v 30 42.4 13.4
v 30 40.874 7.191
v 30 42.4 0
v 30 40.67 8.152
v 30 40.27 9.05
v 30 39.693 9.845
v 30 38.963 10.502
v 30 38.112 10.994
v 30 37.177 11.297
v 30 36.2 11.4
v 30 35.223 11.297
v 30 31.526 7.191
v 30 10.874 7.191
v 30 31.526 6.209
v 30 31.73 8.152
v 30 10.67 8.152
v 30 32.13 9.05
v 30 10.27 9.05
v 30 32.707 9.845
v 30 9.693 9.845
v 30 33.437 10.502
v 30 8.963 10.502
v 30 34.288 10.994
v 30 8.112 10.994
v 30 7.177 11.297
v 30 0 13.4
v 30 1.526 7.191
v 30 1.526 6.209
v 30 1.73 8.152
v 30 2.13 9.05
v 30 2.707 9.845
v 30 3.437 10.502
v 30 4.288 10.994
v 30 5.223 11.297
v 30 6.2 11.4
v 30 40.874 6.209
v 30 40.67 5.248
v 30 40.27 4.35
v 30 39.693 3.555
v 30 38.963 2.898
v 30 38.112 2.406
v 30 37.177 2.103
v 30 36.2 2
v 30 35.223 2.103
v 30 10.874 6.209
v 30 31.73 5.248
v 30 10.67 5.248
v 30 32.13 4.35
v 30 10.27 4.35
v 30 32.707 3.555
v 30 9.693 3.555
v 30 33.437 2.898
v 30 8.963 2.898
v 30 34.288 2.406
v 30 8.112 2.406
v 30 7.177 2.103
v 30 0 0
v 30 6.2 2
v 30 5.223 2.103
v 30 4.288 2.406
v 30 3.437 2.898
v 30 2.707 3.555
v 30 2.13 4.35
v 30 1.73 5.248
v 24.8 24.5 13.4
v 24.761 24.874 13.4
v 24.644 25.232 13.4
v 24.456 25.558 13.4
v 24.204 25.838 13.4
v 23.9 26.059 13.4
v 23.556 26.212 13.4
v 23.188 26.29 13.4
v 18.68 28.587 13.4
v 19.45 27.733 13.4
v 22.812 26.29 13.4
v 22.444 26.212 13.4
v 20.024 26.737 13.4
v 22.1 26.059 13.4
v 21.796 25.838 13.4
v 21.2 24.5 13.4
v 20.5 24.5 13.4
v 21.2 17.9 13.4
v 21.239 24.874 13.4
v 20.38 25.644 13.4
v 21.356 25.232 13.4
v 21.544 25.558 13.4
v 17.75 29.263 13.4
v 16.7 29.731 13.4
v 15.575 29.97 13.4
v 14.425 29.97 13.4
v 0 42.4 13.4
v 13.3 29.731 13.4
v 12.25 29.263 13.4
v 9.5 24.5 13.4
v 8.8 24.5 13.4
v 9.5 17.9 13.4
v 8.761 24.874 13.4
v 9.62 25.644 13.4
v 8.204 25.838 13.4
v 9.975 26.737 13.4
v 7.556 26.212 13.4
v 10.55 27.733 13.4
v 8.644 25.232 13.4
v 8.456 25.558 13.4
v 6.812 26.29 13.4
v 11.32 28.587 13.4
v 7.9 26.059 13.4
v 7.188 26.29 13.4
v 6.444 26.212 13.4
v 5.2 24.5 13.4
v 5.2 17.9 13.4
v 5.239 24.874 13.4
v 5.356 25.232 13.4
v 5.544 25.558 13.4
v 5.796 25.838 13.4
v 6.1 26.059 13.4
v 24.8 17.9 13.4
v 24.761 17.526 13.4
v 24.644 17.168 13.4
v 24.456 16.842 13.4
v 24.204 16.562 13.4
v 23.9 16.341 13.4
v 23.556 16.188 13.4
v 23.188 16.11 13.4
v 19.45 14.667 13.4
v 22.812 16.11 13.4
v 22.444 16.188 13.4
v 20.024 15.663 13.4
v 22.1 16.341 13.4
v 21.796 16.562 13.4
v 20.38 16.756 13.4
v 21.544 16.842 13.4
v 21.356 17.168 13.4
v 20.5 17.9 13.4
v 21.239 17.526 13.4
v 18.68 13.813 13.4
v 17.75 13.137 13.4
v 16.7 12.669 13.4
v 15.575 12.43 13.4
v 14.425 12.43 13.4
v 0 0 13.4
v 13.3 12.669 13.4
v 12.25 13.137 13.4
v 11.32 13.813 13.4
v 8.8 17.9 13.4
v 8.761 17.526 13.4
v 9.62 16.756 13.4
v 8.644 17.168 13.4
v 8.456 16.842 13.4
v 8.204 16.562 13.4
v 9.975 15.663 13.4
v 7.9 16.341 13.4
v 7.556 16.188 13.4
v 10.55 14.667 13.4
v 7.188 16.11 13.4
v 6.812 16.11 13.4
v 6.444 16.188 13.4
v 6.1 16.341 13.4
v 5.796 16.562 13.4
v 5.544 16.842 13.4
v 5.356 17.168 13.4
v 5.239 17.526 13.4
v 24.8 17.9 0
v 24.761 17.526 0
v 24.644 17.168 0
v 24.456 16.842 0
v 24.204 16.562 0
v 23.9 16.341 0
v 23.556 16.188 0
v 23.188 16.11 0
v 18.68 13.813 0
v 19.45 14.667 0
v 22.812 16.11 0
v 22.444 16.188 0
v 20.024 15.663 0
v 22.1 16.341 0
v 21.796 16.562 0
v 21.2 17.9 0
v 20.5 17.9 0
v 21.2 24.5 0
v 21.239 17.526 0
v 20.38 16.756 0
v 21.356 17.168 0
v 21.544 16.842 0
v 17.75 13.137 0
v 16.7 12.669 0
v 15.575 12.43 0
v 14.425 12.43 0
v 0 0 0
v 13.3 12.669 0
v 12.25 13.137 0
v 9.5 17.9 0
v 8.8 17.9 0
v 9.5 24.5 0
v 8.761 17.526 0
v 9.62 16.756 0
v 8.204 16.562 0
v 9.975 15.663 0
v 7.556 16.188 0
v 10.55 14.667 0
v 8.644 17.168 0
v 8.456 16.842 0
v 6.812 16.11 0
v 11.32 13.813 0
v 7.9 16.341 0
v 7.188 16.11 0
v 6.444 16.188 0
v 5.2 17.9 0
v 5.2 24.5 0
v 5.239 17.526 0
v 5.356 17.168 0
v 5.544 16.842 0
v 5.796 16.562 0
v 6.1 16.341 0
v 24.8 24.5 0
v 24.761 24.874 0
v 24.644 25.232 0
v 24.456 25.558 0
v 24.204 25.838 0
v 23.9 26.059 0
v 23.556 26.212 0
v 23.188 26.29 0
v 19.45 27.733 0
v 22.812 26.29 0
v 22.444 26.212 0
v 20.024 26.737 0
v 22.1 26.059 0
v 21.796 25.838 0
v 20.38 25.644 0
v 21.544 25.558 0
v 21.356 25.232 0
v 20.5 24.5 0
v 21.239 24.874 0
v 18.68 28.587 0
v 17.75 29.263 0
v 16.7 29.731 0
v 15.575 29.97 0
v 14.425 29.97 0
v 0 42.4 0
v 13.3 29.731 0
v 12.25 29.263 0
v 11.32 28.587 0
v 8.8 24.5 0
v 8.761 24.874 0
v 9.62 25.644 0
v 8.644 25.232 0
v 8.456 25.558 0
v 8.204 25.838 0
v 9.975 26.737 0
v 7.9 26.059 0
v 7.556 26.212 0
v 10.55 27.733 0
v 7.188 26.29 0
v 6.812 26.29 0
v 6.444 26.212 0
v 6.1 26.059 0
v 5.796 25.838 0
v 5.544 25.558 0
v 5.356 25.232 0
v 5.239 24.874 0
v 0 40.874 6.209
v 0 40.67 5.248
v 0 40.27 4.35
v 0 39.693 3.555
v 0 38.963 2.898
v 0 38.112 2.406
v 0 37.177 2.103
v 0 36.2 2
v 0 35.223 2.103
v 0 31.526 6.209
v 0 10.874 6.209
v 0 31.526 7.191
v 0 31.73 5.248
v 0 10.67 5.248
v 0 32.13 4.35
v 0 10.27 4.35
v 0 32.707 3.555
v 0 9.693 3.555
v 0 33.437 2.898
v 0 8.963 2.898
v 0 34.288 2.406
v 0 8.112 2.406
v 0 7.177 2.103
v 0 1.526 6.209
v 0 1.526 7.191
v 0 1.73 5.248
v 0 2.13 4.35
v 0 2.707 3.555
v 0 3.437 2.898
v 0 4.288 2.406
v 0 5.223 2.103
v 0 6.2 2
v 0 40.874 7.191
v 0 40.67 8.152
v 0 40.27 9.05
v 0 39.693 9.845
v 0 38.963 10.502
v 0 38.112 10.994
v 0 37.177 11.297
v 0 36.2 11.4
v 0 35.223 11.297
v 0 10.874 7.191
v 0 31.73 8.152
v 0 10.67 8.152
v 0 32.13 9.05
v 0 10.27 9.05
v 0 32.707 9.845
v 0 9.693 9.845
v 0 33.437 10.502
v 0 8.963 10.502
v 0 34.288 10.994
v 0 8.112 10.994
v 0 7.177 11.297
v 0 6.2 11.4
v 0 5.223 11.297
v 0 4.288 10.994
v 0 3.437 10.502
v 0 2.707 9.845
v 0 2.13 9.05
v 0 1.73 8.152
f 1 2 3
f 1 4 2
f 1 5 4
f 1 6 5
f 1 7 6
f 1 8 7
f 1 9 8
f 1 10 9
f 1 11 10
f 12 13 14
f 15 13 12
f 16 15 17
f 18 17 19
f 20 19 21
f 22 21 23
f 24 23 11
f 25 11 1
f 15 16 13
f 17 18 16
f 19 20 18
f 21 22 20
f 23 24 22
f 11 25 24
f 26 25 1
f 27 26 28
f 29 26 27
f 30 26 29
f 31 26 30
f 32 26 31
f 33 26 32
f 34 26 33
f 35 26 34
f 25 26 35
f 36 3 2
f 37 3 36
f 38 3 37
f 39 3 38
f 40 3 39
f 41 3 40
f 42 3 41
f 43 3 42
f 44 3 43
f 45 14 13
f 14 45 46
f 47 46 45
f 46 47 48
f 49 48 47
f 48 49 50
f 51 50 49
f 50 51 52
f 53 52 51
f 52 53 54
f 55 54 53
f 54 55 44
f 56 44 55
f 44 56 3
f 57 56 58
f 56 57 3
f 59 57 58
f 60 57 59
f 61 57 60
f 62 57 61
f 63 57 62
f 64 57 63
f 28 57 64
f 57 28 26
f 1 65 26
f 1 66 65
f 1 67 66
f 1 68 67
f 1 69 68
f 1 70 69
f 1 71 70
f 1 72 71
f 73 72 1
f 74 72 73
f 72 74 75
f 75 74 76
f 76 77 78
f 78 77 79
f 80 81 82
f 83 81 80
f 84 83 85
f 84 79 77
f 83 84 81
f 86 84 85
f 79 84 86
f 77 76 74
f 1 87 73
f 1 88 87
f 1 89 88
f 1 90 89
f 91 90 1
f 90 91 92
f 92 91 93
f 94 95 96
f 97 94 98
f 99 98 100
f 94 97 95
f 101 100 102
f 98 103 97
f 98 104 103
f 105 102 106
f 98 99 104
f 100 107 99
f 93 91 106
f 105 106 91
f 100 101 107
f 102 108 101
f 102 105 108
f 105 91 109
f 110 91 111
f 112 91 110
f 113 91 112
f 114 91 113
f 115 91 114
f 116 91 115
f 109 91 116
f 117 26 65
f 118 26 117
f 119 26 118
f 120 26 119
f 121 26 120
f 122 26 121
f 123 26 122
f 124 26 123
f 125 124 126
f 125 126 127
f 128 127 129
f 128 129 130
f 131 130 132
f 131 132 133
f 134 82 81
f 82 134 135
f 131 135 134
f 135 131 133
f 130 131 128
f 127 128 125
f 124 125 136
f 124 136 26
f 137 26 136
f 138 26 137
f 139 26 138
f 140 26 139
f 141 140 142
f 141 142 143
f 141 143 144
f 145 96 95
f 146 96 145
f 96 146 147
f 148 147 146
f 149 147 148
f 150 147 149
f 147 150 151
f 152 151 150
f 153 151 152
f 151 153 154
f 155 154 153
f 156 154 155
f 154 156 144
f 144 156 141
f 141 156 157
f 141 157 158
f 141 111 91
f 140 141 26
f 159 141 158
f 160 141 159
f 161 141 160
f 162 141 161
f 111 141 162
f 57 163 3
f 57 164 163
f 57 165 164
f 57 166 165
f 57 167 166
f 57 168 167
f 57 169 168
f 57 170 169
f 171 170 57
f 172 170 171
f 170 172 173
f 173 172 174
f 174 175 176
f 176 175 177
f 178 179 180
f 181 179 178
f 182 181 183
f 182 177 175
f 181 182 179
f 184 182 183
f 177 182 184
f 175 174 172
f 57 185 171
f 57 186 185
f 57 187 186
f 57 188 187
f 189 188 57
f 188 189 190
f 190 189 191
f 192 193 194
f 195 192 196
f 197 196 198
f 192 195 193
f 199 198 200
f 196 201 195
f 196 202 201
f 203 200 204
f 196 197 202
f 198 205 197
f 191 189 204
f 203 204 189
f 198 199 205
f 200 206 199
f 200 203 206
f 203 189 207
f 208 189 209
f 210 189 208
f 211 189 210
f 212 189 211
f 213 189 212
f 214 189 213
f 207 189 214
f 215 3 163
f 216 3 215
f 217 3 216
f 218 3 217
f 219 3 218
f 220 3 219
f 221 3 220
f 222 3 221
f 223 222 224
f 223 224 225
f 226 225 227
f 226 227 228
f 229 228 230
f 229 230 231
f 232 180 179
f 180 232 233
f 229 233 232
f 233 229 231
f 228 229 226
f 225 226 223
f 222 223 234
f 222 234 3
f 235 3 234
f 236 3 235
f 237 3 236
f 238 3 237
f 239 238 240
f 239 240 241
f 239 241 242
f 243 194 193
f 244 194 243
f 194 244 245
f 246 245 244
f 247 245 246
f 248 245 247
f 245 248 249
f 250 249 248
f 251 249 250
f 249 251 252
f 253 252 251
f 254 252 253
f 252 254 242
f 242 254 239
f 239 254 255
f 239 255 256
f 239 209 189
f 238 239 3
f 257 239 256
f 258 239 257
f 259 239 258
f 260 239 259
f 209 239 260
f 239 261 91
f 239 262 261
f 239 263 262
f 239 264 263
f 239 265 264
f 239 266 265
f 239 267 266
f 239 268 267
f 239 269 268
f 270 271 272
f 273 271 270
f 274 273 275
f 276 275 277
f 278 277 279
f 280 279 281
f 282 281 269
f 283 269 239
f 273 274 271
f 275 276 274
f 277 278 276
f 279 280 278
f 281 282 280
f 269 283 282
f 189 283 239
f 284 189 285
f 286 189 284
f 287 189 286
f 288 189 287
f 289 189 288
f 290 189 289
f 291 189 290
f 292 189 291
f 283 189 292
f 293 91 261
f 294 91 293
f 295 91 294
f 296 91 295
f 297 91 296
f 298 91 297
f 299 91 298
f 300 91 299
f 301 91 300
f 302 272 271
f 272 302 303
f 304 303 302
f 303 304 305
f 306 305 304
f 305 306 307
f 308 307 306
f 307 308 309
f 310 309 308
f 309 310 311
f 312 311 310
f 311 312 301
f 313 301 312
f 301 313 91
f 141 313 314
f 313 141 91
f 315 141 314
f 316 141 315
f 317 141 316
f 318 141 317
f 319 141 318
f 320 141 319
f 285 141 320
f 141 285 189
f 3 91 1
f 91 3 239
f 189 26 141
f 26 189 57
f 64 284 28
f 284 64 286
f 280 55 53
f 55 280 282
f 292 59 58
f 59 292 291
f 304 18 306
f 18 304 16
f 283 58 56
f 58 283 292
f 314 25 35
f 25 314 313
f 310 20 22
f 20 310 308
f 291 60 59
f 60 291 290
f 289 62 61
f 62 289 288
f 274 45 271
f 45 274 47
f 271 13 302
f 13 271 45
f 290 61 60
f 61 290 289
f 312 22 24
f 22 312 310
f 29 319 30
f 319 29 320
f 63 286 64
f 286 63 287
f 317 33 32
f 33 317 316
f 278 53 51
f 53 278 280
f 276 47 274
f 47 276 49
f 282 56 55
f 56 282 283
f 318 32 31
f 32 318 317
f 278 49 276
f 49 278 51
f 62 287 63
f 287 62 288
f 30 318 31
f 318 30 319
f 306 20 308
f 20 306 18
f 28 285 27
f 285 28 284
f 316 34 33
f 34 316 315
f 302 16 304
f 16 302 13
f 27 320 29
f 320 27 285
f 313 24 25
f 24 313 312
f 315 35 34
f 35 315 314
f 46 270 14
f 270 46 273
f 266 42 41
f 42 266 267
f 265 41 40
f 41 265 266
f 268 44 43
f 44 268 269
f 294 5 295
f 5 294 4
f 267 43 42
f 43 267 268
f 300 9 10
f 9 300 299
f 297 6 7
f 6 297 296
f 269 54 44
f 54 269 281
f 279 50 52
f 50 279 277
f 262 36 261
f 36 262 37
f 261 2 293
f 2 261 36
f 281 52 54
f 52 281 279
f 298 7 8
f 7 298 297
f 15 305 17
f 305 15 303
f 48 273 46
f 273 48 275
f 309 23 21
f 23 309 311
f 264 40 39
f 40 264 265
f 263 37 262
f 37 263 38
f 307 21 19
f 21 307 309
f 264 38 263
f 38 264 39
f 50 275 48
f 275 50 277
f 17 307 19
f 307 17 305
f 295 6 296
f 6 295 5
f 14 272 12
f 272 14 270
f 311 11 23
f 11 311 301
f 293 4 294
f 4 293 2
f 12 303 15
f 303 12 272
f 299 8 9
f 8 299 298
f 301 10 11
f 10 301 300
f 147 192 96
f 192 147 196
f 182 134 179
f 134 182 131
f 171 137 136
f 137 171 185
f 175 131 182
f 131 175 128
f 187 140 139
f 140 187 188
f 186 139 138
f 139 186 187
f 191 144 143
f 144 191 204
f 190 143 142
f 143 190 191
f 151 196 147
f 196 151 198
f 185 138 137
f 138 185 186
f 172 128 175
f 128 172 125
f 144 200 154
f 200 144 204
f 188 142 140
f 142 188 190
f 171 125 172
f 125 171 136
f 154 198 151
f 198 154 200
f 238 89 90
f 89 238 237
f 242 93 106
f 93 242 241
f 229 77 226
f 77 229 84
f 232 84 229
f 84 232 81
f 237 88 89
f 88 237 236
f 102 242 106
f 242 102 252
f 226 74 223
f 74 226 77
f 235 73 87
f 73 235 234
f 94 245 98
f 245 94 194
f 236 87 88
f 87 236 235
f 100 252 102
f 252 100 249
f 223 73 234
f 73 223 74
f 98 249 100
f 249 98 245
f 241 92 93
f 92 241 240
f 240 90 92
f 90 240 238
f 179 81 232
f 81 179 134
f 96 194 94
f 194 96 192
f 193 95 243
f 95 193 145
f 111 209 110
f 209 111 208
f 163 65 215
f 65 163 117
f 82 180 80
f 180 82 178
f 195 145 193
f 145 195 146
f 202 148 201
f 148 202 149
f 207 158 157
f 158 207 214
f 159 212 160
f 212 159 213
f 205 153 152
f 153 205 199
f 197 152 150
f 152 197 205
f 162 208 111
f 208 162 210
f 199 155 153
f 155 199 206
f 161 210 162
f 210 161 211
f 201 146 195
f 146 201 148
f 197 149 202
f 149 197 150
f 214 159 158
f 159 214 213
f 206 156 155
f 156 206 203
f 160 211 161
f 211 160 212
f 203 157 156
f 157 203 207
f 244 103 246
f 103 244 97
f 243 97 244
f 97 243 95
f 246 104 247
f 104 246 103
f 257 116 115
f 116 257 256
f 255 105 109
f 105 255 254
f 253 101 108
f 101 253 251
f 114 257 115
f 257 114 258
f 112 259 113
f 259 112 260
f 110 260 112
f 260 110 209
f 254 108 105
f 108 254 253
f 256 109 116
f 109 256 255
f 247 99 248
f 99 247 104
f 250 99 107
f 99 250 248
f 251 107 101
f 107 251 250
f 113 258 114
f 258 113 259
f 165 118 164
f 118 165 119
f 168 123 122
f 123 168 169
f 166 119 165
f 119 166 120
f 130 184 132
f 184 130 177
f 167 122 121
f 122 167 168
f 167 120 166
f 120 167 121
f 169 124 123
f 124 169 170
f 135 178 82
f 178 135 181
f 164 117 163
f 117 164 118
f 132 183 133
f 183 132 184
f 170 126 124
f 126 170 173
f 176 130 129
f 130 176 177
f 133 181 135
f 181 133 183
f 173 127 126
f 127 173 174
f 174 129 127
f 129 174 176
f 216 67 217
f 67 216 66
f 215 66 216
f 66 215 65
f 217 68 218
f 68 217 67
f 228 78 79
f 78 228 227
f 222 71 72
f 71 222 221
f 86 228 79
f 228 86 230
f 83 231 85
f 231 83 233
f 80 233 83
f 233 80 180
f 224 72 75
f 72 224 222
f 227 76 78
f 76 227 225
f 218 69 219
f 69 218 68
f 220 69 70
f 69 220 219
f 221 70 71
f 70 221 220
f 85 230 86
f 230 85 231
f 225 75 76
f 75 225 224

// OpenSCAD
$fn = 30;
l_axis =  30;
d_axis = 9.4;
r_axis = d_axis / 2;
r_nut  = 5.5;
y_wall = 1.5;
z_wall = 2.0;

x_a = 30.0;
y_a = l_axis + d_axis + 2 * y_wall;
z_a = d_axis + 2 * z_wall;
x_c = x_a / 2;
y_1 = r_axis + y_wall;
y_2 = y_1 + l_axis;
y_1n = y_1 + r_axis + y_wall + r_nut;
y_2n = y_2 - r_axis - y_wall - r_nut;

dy_mo = 8;
r_mo = 3.2 / 2 + 0.2;

rot_y = [0,90,0];

module coord_y_nut_holder() {
  difference() {
    cube( [x_a, y_a, z_a] );
    
    // axis
    translate([0,y_1,z_wall+r_axis]) rotate(rot_y) cylinder( r=r_axis, h=x_a );
    translate([0,y_2,z_wall+r_axis]) rotate(rot_y) cylinder( r=r_axis, h=x_a );
    
    // central nut hole
    translate([x_c,y_1n,0]) cylinder( r=r_nut, h=z_a );
    translate([x_c,y_2n,0]) cylinder( r=r_nut, h=z_a );
    translate([x_c-r_nut,y_1n,0])    cube( [2*r_nut,y_2n-y_1n,z_a] );
    
    // mounting nut holes
    translate([x_c-dy_mo-r_mo,y_1n,0])    cube( [2*r_mo,y_2n-y_1n,z_a] );
    translate([x_c+dy_mo-r_mo,y_1n,0])    cube( [2*r_mo,y_2n-y_1n,z_a] );
    translate([x_c-dy_mo,y_1n,0]) cylinder( r=r_mo, h=z_a );
    translate([x_c-dy_mo,y_2n,0]) cylinder( r=r_mo, h=z_a );
    translate([x_c+dy_mo,y_1n,0]) cylinder( r=r_mo, h=z_a );
    translate([x_c+dy_mo,y_2n,0]) cylinder( r=r_mo, h=z_a );
  }

}

coord_y_nut_holder();

echo( y_a, z_a, (y_2n-y_1n) );
